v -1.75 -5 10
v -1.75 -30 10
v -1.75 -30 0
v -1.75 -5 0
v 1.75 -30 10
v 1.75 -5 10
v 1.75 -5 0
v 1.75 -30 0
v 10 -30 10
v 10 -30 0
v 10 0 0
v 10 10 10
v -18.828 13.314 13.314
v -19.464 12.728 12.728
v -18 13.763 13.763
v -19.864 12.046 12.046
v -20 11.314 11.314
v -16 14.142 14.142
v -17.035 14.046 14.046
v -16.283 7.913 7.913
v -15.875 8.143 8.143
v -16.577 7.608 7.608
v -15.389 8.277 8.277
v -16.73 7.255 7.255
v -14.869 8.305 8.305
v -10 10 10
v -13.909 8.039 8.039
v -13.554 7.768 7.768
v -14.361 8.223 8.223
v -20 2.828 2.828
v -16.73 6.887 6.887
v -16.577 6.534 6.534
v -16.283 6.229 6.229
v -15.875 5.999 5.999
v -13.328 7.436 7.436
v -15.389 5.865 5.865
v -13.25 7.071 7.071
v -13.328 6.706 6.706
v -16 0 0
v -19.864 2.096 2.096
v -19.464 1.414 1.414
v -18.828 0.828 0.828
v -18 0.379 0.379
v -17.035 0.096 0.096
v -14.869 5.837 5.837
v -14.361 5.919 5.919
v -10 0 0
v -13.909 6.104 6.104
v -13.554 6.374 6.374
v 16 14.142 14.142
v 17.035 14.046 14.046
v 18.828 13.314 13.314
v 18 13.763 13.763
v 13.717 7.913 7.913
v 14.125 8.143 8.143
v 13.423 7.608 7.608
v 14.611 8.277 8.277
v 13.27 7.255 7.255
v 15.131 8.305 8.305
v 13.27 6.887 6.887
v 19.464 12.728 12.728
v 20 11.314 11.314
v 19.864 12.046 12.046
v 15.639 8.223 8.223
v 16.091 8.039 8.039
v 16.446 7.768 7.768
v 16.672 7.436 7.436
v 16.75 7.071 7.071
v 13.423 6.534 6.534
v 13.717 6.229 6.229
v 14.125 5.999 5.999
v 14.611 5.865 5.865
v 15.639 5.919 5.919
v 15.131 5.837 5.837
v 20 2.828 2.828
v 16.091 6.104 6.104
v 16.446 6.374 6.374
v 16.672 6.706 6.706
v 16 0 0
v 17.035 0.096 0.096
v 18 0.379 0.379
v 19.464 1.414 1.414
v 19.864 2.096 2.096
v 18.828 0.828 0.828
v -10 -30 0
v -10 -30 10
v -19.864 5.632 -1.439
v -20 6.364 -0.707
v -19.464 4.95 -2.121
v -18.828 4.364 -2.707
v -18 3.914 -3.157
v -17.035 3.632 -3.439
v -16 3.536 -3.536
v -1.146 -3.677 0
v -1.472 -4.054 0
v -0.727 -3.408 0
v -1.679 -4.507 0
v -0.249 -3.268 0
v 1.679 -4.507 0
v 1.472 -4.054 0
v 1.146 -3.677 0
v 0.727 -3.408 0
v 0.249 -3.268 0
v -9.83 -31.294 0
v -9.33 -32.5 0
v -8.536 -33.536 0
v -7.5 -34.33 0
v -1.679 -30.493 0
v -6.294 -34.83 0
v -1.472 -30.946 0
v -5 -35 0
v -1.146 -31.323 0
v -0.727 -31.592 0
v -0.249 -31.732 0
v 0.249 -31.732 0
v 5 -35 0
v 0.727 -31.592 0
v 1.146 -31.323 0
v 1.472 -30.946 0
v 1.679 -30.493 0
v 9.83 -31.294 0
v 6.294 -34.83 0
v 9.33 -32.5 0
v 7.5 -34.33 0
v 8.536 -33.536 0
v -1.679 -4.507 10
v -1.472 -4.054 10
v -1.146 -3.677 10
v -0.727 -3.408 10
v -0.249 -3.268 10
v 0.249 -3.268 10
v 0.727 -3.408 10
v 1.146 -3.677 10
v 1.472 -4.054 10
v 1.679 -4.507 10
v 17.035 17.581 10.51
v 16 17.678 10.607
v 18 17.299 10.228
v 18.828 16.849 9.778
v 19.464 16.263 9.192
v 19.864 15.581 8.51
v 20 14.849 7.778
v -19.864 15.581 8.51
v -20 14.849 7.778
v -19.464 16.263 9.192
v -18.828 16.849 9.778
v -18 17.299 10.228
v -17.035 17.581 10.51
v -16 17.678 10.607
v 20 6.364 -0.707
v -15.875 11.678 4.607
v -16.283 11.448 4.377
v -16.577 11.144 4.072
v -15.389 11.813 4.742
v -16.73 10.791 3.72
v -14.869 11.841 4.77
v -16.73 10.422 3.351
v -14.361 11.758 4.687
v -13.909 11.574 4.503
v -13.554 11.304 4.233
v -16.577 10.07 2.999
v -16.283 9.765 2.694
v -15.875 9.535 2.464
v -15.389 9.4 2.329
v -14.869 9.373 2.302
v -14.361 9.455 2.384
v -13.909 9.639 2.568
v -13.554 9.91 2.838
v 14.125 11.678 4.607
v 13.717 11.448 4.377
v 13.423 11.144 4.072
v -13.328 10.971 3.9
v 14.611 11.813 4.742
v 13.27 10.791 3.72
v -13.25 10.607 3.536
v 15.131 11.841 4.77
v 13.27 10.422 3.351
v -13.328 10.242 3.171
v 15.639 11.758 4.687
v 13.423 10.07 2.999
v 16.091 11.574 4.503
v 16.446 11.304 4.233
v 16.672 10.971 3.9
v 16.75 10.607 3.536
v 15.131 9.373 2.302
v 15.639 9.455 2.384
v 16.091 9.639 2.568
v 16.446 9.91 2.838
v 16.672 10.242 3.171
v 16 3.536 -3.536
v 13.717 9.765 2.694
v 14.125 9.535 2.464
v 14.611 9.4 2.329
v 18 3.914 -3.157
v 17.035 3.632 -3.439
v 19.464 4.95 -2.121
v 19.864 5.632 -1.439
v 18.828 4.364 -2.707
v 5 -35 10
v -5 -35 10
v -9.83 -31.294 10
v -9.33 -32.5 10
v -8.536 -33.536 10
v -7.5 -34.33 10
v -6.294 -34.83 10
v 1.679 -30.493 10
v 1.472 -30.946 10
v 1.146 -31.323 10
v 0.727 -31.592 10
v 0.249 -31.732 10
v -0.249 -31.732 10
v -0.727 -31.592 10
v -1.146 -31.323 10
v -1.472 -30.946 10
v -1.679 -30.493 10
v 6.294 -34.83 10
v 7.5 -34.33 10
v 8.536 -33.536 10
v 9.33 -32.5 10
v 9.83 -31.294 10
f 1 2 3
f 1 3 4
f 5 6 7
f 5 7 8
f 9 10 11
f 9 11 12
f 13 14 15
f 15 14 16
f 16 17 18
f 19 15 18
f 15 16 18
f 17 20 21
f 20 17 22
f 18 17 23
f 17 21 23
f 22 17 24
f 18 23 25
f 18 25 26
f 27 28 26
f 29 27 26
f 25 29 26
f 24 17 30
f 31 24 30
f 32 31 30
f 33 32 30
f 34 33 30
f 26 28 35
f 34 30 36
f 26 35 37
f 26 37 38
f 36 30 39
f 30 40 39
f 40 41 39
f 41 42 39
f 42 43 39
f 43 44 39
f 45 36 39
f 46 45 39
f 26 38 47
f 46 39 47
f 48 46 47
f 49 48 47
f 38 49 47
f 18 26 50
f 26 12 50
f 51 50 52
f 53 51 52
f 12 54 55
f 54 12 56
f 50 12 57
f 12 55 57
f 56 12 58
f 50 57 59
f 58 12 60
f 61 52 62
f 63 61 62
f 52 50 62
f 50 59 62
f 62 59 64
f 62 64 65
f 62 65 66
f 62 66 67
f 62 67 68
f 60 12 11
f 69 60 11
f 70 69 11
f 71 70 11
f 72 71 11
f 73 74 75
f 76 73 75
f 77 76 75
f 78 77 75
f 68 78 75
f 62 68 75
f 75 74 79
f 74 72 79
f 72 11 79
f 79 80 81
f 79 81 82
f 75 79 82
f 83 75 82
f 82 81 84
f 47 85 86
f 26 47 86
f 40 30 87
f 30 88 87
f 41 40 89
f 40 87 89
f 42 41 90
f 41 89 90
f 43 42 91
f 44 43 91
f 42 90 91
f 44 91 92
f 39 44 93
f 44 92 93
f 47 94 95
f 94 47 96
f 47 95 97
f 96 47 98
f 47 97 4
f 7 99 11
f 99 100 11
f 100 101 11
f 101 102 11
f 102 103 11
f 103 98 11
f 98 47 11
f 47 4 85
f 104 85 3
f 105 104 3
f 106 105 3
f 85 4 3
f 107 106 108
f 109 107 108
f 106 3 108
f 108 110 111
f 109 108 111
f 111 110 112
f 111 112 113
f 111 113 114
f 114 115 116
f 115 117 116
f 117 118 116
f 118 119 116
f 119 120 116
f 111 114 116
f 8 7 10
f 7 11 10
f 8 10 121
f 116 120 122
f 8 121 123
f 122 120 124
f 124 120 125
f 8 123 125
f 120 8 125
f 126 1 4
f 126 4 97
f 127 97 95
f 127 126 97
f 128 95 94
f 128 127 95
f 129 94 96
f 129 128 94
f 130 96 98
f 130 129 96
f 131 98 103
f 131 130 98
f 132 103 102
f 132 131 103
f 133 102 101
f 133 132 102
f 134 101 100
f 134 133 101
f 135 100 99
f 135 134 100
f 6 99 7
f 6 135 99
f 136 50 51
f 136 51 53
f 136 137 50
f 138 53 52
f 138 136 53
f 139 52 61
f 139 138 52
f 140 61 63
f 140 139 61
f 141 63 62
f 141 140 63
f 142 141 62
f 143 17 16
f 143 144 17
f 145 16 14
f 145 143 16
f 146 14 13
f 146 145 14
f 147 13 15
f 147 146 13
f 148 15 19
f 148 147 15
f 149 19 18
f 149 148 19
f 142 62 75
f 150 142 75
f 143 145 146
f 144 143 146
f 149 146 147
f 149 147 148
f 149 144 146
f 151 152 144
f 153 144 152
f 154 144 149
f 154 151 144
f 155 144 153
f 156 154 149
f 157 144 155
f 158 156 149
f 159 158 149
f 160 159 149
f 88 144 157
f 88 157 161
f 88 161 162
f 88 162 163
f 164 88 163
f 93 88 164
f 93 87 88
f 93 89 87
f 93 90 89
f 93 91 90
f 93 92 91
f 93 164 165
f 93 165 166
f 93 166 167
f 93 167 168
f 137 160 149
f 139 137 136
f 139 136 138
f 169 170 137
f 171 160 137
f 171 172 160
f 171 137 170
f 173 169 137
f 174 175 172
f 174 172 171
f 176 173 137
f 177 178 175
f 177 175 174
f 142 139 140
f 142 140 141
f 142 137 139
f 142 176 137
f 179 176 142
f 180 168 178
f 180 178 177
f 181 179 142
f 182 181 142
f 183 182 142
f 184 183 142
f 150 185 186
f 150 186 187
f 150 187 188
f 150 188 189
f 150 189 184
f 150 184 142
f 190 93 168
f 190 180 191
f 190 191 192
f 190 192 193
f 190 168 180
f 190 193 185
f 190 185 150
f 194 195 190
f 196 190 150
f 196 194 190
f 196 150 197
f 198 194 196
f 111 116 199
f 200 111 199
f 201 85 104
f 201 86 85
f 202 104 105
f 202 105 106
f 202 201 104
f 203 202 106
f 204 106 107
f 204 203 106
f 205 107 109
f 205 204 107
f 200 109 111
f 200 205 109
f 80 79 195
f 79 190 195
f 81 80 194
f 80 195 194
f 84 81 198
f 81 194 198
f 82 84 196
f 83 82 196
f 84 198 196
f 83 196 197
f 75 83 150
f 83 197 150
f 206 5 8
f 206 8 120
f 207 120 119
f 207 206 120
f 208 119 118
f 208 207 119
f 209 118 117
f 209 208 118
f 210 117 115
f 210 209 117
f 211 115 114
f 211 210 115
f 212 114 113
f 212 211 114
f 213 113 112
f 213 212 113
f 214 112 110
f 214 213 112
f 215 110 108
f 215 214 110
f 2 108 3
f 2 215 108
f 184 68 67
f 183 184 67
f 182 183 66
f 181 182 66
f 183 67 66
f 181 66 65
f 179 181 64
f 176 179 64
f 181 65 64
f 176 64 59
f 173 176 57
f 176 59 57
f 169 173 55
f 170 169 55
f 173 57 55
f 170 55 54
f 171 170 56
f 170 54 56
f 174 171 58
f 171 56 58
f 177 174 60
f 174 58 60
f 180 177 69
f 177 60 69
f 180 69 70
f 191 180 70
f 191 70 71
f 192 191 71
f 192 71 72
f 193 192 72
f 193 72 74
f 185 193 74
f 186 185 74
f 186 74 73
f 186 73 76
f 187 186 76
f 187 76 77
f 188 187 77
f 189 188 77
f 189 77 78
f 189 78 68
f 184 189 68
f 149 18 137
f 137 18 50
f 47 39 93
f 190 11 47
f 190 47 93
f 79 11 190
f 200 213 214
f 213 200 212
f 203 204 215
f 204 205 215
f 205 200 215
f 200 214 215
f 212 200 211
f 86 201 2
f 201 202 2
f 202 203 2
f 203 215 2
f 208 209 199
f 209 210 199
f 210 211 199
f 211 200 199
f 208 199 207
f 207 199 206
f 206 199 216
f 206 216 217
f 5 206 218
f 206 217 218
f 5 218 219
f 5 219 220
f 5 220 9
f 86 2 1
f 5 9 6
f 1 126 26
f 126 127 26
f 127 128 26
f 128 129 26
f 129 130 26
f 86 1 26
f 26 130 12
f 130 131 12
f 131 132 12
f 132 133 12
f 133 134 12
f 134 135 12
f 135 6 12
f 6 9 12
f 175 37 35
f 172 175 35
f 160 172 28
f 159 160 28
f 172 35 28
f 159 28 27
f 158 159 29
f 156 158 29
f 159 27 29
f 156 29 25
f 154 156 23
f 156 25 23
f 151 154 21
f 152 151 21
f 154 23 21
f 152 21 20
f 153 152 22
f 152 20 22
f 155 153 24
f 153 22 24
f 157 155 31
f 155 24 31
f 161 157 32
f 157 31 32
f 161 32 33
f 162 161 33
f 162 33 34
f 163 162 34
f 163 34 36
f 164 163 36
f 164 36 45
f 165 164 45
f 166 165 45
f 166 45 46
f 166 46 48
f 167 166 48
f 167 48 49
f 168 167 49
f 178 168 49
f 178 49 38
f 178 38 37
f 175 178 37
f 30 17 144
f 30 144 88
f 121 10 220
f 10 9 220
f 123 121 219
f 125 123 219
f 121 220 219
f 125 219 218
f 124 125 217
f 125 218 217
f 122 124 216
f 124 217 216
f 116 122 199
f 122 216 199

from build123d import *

# Parameters (mm, degrees)
BOSS_EXTRUDE1_DEPTH = 10
CUT_EXTRUDE1_DEPTH  = 11
FILLET1_R           = 5
SKETCH3_W           = 40
SKETCH3_H           = 20
BOSS_EXTRUDE2_DEPTH = 5
SKETCH4_R           = 1.75
CUT_EXTRUDE2_DEPTH  = 16
FILLET2_R           = 4


with BuildPart() as part:
    # Sketch1 → Boss-Extrude1 (new body, symmetric)
    with BuildSketch(Plane(origin=(0, 0, 0), x_dir=(0, 0, -1), z_dir=(1, 0, 0))):
        Polygon((0, 0), (0, -35), (-10, -35), (-10, 10), align=None)
    extrude(amount=BOSS_EXTRUDE1_DEPTH, both=True)

    # Sketch2 → Cut-Extrude1 (cut, through all)
    with BuildSketch(Plane.XY.offset(10)):
        with BuildLine():
            Line((1.75, -5), (1.75, -30))
            ThreePointArc((1.75, -30), (0, -31.75), (-1.75, -30))
            Line((-1.75, -30), (-1.75, -5))
            ThreePointArc((-1.75, -5), (0, -3.25), (1.75, -5))
        make_face()
    extrude(amount=-CUT_EXTRUDE1_DEPTH, mode=Mode.SUBTRACT)

    # Fillet1
    fillet1_edges = [part.edges().sort_by_distance(p)[0] for p in [
        (10, -35, 5),
        (-10, -35, 5),
    ]]
    fillet(fillet1_edges, radius=FILLET1_R)

    # Sketch3 → Boss-Extrude2 (add)
    with BuildSketch(Plane(origin=(0, 0, 0), x_dir=(1, 0, 0), z_dir=(0, 0.707106781, -0.707106781))):
        with Locations((0, -10)):
            Rectangle(SKETCH3_W, SKETCH3_H)
    extrude(amount=BOSS_EXTRUDE2_DEPTH)

    # Sketch4 → Cut-Extrude2 (cut, through all)
    with BuildSketch(Plane(origin=(0, 0, 0), x_dir=(1, 0, 0), z_dir=(0, -0.707106781, 0.707106781))):
        with Locations((-15, 10)):
            Circle(SKETCH4_R)
        with Locations((15, 10)):
            Circle(SKETCH4_R)
    extrude(amount=-CUT_EXTRUDE2_DEPTH, mode=Mode.SUBTRACT)

    # Fillet2
    fillet2_edges = [part.edges().sort_by_distance(p)[0] for p in [
        (-20, 1.767766953, -1.767766953),
        (-20, 15.909902577, 12.374368671),
        (20, 15.909902577, 12.374368671),
        (20, 1.767766953, -1.767766953),
    ]]
    fillet(fillet2_edges, radius=FILLET2_R)


solid = part.part
